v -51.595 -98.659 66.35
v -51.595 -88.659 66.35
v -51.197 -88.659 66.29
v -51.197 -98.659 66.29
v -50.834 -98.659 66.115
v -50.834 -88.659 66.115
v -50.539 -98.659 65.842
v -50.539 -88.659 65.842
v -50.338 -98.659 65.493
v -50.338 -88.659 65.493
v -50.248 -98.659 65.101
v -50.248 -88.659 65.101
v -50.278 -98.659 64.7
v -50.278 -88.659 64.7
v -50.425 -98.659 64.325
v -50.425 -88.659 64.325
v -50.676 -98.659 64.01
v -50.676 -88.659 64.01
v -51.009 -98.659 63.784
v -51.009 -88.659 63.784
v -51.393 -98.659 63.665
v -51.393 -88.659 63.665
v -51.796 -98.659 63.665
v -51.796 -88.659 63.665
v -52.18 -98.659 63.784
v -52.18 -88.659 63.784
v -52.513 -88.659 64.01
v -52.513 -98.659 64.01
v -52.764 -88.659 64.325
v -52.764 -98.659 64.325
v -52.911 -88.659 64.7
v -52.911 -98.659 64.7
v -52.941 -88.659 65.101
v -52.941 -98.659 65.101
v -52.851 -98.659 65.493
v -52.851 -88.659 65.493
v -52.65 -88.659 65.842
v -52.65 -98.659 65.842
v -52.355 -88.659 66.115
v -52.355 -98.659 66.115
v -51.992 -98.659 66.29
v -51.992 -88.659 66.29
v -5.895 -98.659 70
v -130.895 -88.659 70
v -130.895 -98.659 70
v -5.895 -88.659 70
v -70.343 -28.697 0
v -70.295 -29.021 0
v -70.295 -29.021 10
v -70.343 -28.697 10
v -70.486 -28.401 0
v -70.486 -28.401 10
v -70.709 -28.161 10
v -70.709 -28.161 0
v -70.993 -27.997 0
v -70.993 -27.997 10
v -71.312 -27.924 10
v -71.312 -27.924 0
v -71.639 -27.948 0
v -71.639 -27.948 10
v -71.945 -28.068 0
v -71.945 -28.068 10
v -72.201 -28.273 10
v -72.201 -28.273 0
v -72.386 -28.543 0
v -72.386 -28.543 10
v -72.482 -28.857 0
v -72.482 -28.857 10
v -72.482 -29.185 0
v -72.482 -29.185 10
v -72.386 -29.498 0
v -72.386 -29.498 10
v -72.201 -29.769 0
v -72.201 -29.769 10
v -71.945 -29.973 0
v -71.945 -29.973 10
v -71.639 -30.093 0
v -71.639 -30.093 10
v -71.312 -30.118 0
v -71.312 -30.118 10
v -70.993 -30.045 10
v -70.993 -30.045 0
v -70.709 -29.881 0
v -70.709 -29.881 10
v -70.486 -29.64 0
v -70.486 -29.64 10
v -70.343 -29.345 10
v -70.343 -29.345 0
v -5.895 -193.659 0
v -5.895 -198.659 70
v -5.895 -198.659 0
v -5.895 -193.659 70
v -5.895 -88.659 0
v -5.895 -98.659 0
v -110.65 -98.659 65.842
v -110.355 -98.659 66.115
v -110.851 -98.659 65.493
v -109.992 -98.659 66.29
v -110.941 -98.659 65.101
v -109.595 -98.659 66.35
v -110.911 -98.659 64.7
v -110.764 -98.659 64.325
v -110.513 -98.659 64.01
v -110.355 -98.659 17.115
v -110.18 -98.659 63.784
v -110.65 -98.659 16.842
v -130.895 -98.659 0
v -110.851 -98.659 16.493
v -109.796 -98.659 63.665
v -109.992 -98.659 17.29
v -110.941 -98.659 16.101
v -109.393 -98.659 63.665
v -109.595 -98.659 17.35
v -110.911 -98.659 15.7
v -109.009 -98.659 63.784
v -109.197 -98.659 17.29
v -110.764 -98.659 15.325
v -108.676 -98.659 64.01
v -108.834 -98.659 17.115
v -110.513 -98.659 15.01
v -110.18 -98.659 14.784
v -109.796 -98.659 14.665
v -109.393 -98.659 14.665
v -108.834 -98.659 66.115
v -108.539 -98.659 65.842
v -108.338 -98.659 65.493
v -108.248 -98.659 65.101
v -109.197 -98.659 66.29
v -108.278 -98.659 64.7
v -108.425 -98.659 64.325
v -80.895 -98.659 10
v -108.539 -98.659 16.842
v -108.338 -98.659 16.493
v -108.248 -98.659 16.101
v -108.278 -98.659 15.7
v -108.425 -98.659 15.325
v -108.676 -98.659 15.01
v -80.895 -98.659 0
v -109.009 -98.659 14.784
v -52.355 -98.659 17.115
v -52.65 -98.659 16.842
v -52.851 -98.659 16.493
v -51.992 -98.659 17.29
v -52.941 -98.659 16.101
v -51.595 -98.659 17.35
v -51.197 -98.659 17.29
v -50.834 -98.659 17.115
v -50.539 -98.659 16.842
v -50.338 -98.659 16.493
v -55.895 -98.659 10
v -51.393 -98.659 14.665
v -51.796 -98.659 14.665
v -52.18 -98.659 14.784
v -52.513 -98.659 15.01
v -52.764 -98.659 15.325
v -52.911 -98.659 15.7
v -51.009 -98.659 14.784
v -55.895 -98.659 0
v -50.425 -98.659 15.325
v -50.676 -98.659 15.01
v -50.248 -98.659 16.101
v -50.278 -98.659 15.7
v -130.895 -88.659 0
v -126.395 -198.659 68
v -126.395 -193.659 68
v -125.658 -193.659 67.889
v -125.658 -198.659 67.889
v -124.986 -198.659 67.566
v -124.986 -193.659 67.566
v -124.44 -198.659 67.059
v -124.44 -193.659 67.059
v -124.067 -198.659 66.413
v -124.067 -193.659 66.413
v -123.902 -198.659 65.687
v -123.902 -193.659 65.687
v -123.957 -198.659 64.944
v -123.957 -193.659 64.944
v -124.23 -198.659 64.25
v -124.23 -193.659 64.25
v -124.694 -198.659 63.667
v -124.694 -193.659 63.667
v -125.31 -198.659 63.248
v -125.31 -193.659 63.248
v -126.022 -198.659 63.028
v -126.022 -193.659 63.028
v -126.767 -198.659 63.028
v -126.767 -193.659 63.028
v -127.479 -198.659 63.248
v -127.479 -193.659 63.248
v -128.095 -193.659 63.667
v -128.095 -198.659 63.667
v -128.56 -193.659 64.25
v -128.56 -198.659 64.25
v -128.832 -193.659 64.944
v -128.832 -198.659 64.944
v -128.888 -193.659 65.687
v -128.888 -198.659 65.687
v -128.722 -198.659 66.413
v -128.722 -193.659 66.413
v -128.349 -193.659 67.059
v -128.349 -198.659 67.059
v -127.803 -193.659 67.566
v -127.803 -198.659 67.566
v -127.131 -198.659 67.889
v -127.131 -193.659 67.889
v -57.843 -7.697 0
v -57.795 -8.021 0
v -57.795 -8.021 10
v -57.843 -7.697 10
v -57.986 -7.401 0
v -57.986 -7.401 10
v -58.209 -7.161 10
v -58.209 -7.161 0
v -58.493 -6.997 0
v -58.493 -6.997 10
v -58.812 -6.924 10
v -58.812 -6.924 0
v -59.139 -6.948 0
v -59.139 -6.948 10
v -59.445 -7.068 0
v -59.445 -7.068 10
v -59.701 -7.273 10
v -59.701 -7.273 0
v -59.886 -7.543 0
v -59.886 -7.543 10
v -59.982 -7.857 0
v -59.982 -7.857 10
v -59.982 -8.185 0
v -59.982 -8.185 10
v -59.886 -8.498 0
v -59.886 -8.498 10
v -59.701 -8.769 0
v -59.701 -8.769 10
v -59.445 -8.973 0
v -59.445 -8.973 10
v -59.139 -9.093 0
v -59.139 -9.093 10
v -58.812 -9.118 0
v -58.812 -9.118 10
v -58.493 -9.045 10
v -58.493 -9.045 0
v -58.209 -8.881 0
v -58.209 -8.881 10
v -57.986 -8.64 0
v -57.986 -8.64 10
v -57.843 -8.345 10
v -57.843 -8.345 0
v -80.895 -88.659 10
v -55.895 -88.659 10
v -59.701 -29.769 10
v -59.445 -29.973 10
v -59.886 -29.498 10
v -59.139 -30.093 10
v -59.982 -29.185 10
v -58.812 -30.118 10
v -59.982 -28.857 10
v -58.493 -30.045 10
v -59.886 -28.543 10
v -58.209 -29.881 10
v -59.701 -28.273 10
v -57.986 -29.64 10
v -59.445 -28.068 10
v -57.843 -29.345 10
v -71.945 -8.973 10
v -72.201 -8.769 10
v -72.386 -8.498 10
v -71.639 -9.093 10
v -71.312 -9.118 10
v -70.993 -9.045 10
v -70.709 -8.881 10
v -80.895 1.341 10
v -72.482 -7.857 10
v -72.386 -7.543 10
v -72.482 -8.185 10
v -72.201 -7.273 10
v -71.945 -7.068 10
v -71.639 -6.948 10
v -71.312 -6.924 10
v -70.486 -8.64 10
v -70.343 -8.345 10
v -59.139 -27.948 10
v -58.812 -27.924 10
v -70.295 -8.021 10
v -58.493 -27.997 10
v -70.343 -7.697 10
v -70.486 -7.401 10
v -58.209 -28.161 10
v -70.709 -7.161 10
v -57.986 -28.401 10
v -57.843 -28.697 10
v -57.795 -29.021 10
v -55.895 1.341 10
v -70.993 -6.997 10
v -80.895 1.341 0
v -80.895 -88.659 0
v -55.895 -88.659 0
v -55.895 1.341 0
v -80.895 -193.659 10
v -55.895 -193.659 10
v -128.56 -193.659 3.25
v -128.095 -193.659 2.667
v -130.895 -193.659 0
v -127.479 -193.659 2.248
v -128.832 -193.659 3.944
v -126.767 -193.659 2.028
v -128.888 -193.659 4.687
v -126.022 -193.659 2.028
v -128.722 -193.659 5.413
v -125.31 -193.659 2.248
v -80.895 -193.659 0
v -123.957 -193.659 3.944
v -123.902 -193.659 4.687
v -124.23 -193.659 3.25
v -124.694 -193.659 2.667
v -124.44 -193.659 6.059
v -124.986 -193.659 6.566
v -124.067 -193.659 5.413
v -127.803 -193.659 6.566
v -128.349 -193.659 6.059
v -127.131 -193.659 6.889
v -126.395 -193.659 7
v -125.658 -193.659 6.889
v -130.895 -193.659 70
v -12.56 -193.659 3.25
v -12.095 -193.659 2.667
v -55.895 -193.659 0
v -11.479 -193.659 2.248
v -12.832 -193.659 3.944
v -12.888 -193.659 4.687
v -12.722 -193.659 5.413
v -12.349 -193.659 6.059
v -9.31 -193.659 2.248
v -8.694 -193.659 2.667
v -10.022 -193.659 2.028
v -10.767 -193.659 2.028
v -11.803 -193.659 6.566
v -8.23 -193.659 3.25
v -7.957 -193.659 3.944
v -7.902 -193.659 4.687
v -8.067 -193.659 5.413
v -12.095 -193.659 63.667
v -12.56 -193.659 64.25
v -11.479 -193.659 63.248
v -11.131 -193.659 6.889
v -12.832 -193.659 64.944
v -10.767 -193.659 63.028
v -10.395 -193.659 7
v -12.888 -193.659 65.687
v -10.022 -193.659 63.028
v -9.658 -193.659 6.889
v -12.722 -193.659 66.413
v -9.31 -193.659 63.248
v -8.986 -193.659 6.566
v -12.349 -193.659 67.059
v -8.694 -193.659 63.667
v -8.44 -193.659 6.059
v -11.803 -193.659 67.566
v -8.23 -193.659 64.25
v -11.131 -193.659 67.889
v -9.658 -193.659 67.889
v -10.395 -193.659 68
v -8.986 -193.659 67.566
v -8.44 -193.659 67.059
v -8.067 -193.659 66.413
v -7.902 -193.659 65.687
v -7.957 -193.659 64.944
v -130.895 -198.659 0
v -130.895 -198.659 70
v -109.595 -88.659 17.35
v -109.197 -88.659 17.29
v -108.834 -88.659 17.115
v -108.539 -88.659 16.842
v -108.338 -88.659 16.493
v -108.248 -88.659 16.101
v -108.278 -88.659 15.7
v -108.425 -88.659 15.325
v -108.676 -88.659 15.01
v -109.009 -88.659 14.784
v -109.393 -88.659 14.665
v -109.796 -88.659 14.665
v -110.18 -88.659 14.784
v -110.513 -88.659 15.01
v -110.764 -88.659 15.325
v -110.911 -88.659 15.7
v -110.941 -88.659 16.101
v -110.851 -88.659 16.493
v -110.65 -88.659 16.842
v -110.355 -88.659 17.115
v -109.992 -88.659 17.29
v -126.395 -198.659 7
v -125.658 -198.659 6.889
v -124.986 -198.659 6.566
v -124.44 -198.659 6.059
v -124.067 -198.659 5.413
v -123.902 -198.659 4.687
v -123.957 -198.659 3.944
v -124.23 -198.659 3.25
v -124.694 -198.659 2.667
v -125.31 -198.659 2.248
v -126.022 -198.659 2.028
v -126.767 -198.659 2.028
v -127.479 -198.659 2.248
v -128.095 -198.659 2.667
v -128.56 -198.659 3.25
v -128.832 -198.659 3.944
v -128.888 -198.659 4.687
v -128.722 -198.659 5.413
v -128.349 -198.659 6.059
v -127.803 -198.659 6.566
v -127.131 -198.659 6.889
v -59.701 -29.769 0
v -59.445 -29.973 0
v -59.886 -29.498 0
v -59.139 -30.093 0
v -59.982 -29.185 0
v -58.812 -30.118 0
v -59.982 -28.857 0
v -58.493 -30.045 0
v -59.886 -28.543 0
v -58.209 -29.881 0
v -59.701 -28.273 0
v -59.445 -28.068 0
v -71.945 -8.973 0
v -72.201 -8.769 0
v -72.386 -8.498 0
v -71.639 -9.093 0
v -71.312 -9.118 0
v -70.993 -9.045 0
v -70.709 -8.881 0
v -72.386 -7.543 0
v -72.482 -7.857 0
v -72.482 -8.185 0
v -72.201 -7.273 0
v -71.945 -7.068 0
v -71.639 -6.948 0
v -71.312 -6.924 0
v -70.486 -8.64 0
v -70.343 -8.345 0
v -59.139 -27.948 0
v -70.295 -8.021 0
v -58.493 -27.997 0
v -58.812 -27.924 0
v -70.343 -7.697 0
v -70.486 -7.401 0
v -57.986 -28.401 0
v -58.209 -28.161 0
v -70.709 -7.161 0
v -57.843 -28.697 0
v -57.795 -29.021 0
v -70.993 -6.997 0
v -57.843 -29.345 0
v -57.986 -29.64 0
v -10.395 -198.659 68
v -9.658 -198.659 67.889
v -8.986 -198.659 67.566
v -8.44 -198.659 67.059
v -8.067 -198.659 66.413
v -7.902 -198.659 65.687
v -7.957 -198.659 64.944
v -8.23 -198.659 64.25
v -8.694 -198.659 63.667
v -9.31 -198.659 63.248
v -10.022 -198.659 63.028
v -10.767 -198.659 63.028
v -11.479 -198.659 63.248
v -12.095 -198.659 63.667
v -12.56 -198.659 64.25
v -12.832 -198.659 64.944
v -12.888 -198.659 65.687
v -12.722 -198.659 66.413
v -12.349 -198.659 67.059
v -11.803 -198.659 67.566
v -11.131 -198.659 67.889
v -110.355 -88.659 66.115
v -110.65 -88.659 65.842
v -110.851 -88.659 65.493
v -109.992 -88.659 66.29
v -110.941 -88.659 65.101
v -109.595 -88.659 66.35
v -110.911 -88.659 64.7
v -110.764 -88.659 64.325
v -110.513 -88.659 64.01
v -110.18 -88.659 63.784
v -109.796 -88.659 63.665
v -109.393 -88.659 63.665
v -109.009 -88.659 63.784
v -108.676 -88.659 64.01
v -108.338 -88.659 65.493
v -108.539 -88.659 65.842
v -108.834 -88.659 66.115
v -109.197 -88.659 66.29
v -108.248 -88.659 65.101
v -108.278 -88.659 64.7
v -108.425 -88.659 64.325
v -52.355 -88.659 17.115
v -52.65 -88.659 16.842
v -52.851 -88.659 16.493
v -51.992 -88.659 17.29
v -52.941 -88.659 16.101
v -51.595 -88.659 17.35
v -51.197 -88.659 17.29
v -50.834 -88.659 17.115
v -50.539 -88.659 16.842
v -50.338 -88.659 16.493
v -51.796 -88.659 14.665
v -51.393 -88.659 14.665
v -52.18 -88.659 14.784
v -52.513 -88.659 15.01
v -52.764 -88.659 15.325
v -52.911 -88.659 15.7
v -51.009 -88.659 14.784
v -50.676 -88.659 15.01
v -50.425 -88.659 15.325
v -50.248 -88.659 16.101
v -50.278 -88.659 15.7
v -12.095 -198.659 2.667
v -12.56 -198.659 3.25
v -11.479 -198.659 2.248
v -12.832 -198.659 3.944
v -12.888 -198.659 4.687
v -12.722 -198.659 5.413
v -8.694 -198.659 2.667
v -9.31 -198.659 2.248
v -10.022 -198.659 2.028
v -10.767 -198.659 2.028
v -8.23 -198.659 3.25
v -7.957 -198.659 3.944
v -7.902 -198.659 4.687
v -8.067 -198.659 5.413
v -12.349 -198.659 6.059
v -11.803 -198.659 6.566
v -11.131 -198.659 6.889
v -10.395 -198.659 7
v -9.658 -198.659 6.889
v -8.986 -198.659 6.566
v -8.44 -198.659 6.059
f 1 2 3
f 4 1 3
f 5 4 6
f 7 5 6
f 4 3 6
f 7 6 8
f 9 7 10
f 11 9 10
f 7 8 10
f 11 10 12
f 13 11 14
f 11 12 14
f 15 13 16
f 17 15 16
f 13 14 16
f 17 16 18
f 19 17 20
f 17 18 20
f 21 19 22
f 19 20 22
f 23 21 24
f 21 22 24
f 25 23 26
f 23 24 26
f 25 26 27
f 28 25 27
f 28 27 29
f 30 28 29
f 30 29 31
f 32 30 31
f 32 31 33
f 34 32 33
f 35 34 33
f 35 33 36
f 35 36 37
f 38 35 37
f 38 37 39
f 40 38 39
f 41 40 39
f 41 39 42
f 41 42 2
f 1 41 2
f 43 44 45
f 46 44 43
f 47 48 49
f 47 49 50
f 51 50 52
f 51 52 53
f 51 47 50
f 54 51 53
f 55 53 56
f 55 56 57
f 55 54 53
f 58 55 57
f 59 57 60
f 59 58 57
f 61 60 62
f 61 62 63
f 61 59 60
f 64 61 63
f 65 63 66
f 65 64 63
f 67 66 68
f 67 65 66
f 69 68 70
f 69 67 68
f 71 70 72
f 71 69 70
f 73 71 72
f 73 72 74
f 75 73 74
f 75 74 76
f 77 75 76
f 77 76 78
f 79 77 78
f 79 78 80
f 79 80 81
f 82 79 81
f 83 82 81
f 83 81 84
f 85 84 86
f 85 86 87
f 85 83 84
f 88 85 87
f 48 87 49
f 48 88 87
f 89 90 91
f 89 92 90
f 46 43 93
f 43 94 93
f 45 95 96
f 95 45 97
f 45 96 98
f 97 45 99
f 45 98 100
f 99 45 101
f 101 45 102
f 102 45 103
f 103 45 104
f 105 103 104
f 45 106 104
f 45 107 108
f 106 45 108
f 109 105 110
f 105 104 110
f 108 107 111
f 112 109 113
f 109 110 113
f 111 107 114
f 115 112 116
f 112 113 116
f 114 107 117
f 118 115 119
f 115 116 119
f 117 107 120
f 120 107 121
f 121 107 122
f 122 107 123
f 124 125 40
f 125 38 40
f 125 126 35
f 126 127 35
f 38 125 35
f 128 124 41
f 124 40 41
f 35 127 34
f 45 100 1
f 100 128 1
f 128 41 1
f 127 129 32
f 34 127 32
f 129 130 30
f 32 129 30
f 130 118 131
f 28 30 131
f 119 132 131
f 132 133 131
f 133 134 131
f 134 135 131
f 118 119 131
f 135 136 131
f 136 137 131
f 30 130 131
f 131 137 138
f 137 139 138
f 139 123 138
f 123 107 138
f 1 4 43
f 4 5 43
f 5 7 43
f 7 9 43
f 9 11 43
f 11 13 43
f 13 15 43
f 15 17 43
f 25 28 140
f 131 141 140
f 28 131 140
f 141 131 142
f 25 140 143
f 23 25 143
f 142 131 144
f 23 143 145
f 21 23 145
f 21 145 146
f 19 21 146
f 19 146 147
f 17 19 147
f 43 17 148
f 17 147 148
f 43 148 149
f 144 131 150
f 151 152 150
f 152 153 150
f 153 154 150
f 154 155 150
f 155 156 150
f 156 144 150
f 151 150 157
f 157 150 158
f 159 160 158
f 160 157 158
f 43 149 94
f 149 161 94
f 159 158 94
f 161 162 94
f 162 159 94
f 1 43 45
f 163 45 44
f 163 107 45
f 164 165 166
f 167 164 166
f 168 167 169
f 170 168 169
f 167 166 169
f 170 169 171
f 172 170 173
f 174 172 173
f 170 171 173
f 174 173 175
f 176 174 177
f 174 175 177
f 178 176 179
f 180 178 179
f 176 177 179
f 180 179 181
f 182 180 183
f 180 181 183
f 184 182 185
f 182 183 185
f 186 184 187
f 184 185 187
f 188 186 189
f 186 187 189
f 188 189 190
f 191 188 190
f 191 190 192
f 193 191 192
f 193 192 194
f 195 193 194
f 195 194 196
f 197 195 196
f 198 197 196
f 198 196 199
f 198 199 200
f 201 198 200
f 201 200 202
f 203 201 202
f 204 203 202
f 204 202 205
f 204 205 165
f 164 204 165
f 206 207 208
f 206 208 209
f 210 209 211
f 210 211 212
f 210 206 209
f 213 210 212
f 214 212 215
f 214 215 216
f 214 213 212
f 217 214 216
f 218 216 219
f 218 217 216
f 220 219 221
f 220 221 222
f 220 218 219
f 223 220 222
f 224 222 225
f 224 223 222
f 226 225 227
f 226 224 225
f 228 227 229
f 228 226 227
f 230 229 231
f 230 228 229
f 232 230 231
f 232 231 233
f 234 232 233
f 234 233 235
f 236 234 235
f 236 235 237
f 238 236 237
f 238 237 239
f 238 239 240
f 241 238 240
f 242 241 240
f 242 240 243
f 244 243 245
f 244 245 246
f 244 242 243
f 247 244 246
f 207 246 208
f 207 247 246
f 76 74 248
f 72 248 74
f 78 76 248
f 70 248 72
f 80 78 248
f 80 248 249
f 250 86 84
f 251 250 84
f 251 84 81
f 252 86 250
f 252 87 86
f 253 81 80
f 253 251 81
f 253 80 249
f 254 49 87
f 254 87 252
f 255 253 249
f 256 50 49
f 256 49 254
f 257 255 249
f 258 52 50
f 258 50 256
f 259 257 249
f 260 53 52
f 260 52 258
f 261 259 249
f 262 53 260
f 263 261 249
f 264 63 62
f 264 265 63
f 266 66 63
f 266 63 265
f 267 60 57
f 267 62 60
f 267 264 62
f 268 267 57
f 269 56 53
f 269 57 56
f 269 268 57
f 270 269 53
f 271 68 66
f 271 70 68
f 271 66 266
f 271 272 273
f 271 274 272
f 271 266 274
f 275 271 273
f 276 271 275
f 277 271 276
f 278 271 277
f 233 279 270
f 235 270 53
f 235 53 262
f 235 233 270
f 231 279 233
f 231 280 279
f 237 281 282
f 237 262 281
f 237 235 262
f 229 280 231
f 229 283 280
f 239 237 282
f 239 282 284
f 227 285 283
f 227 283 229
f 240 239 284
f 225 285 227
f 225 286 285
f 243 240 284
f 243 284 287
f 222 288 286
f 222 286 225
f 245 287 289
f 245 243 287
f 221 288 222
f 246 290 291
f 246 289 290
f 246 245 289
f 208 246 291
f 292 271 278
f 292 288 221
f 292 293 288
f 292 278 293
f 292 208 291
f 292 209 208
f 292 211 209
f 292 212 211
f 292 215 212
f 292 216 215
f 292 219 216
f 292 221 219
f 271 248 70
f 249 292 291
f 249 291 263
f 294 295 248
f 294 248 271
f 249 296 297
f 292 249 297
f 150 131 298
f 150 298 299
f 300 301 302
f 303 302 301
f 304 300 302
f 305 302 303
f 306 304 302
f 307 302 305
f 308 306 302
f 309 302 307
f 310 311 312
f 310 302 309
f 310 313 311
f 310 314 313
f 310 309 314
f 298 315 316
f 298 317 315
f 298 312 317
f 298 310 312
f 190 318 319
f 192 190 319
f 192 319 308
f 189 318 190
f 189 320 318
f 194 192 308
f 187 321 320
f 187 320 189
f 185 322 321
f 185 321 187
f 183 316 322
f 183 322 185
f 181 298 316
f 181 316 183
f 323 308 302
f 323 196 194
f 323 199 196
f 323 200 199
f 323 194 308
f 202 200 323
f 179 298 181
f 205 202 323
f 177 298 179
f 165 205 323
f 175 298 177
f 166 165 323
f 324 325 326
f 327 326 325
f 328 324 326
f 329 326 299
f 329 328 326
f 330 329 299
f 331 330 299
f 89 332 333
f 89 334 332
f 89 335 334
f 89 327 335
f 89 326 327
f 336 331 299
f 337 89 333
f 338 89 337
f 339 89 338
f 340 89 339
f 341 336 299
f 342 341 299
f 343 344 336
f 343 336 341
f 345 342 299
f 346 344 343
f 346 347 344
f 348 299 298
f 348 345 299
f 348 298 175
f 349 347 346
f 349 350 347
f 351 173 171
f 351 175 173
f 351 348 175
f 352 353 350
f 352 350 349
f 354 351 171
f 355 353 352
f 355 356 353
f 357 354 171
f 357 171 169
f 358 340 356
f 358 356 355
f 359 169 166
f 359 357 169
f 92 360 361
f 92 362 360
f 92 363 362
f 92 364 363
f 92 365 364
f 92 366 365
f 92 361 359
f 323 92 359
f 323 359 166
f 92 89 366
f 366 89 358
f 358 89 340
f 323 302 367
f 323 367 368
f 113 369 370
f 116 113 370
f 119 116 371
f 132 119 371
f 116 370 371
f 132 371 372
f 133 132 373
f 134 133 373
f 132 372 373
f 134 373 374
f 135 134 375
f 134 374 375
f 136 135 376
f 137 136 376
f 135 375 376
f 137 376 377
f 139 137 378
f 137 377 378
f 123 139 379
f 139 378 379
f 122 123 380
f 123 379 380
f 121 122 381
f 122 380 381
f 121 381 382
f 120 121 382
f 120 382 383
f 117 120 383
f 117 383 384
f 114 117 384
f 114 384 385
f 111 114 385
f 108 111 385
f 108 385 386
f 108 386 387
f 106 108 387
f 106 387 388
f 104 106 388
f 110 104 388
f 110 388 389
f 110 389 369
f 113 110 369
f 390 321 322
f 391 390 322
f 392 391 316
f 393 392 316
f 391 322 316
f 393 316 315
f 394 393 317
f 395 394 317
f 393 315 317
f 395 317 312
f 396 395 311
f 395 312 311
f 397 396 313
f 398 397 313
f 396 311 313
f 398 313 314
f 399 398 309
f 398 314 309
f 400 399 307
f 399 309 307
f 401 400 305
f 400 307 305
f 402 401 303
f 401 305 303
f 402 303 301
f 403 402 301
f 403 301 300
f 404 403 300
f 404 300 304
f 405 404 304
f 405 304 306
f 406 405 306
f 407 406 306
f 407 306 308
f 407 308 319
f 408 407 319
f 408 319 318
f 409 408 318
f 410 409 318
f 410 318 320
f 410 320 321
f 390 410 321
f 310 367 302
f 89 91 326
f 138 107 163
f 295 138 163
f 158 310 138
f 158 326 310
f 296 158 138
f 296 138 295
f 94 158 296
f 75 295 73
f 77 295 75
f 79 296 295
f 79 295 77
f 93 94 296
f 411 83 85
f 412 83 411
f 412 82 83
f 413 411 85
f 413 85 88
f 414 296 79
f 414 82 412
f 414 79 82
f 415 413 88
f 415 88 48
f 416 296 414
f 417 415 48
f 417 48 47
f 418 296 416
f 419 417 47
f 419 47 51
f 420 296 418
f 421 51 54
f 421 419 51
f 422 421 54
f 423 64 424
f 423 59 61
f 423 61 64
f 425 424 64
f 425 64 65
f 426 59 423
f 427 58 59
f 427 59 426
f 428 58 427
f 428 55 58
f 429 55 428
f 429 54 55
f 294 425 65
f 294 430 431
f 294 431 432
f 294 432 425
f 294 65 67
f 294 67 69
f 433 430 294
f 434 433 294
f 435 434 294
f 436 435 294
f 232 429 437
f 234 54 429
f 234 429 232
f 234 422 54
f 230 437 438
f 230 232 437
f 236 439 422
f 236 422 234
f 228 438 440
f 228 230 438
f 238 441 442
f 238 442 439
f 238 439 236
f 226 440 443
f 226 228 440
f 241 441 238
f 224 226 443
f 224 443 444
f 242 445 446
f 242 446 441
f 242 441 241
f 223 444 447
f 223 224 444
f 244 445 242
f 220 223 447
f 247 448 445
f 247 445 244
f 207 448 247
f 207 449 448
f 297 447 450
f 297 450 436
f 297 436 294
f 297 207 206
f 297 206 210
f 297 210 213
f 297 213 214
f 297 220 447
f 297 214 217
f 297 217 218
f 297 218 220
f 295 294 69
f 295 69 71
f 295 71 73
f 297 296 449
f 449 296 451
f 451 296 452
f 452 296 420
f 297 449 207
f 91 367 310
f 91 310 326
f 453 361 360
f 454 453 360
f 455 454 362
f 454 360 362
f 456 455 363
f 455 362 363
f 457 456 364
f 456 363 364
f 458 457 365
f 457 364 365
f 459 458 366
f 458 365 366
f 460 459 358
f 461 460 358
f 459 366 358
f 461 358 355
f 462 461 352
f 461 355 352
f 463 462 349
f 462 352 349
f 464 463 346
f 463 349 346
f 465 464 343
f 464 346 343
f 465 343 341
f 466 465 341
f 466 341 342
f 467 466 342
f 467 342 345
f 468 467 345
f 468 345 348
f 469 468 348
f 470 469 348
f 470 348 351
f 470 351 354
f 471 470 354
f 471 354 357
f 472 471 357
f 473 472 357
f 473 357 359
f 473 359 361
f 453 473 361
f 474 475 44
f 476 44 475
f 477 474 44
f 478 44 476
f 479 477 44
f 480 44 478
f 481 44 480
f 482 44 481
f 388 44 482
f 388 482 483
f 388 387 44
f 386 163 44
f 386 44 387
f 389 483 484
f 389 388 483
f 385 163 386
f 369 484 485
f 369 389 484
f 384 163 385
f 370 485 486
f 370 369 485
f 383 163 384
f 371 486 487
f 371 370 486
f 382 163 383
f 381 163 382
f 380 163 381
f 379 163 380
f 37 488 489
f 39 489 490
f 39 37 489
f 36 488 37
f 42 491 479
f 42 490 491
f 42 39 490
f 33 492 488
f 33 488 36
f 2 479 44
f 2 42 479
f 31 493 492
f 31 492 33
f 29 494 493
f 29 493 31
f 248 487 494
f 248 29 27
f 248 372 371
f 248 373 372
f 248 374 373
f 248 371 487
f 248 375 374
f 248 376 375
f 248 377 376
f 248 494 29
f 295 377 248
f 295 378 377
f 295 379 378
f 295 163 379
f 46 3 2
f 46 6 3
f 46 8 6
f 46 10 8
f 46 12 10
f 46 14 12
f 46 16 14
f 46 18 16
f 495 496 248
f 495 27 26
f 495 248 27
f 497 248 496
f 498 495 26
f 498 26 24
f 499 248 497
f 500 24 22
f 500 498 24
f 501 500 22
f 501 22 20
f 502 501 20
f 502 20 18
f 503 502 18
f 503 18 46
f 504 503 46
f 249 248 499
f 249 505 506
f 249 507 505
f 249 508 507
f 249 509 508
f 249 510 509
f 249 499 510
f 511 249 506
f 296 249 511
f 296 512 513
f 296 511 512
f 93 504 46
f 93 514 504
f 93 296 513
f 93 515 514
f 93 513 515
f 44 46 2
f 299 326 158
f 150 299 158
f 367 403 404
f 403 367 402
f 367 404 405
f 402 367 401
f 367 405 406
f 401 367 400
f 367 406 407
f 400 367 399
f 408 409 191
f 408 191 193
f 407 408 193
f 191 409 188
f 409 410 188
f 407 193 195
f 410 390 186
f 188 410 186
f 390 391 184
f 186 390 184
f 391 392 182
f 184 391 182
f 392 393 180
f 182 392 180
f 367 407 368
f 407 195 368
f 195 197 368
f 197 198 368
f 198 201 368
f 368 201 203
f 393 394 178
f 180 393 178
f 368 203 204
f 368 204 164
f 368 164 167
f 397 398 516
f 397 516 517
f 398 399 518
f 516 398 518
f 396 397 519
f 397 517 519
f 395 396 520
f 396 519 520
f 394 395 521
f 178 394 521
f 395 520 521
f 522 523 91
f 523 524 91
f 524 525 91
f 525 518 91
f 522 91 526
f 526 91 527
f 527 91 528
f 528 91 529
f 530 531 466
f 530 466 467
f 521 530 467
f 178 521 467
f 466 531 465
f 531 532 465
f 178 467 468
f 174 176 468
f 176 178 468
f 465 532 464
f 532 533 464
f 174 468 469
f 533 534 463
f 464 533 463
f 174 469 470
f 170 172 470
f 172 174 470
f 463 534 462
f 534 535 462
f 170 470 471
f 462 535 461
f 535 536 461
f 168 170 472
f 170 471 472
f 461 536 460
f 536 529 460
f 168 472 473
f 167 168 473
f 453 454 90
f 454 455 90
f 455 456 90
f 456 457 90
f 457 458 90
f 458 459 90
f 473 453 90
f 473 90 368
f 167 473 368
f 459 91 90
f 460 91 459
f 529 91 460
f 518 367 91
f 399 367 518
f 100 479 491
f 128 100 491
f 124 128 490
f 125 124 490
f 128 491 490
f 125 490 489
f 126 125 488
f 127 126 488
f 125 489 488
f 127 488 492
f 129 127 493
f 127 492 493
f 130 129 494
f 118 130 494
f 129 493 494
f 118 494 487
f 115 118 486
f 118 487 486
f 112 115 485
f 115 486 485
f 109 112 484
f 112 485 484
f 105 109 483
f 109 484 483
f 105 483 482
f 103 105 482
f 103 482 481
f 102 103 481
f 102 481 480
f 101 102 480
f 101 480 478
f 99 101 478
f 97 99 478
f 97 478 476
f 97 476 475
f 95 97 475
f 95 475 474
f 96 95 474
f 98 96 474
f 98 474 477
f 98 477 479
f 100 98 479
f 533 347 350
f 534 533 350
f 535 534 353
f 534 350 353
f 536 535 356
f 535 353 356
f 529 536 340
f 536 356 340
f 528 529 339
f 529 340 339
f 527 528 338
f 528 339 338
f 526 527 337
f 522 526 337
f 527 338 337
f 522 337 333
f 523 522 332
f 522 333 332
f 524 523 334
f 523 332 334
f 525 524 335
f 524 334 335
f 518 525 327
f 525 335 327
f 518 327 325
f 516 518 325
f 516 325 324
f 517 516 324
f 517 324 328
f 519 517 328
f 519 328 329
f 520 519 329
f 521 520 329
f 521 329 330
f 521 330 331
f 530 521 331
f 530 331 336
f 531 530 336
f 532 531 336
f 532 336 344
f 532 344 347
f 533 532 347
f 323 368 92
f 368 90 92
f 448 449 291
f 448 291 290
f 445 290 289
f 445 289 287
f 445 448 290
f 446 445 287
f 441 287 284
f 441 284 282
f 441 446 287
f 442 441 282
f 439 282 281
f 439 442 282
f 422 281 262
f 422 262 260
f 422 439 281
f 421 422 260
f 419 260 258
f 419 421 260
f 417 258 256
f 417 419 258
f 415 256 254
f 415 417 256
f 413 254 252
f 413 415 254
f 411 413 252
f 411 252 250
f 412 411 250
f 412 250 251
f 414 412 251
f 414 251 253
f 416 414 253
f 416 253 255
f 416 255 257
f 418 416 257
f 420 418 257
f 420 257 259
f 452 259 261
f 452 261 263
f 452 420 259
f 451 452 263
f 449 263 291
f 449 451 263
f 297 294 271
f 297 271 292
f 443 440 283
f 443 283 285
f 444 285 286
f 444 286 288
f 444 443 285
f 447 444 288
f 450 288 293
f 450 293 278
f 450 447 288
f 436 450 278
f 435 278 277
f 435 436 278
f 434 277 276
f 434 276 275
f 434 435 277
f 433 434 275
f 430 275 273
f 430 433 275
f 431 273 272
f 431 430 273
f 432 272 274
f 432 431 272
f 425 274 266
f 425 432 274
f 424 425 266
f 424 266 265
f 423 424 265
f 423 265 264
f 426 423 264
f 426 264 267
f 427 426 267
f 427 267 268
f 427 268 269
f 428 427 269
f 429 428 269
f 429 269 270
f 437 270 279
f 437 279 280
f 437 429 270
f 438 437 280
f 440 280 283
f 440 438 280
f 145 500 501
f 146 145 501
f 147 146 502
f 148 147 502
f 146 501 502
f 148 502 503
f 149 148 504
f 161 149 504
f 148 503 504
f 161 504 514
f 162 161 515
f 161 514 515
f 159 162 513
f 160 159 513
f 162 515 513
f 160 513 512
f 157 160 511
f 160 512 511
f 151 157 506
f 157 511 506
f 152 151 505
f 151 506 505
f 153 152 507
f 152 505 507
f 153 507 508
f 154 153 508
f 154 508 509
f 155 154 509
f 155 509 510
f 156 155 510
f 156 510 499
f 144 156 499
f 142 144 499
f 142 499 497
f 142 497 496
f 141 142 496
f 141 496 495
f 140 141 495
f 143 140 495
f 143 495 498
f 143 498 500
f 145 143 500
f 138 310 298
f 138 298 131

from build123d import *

# Parameters (mm, degrees)
SKETCH2_W           = 25
SKETCH2_H           = 90
SKETCH2_R           = 1.1
SKETCH2_H_2         = 10
SKETCH2_W_2         = 50
SKETCH2_H_3         = 100
BOSS_EXTRUDE3_DEPTH = 10
SKETCH5_W           = 125
SKETCH5_H           = 10
BOSS_EXTRUDE4_DEPTH = 60
SKETCH6_W           = 75
SKETCH6_H           = 5
BOSS_EXTRUDE5_DEPTH = 60
SKETCH8_W           = 10
SKETCH8_H           = 5
BOSS_EXTRUDE7_DEPTH = 50
SKETCH7_W           = 70
SKETCH7_H           = 5
BOSS_EXTRUDE8_DEPTH = 50
SKETCH12_R          = 2.5
CUT_EXTRUDE1_DEPTH  = 246.068129549
CUT_EXTRUDE2_REACH  = 186.752
SKETCH13_R          = 1.35


with BuildPart() as part:
    # Sketch2 → Boss-Extrude3 (new body)
    # profile 1 of 5: a face of its own
    with BuildSketch(Plane.XY):
        with Locations((-68.394568721, -43.658737525)):
            Rectangle(SKETCH2_W, SKETCH2_H)
        with Locations((-71.394568721, -29.020737525)):
            Circle(SKETCH2_R, mode=Mode.SUBTRACT)
        with Locations((-71.394568721, -8.020737525)):
            Circle(SKETCH2_R, mode=Mode.SUBTRACT)
        with Locations((-58.894568721, -29.020737525)):
            Circle(SKETCH2_R, mode=Mode.SUBTRACT)
        with Locations((-58.894568721, -8.020737525)):
            Circle(SKETCH2_R, mode=Mode.SUBTRACT)
    # profile 2 of 5: a face of its own
    with BuildSketch(Plane.XY):
        with Locations((-68.394568721, -93.658737525)):
            Rectangle(SKETCH2_W, SKETCH2_H_2)
    # profile 3 of 5: a face of its own
    with BuildSketch(Plane.XY):
        with Locations((-105.894568721, -93.658737525)):
            Rectangle(SKETCH2_W_2, SKETCH2_H_2)
    # profile 4 of 5: a face of its own
    with BuildSketch(Plane.XY):
        with Locations((-30.894568721, -93.658737525)):
            Rectangle(SKETCH2_W_2, SKETCH2_H_2)
    # profile 5 of 5: a face of its own
    with BuildSketch(Plane.XY):
        with Locations((-68.394568721, -148.658737525)):
            Rectangle(SKETCH2_W, SKETCH2_H_3)
    extrude(amount=BOSS_EXTRUDE3_DEPTH)

    # Sketch5 → Boss-Extrude4 (add)
    with BuildSketch(Plane.XY.offset(10)):
        with Locations((-68.394568721, -93.658737525)):
            Rectangle(SKETCH5_W, SKETCH5_H)
    extrude(amount=BOSS_EXTRUDE4_DEPTH)

    # Sketch6 → Boss-Extrude5 (add)
    with BuildSketch(Plane.XY.offset(10)):
        with Locations((-43.394568721, -196.158737525)):
            Rectangle(SKETCH6_W, SKETCH6_H)
    extrude(amount=BOSS_EXTRUDE5_DEPTH)

    # Sketch8 → Boss-Extrude7 (add)
    with BuildSketch(Plane(origin=(-55.894568721, 0, 0), x_dir=(0, 0, -1), z_dir=(1, 0, 0))):
        with Locations((-5, -196.158737525)):
            Rectangle(SKETCH8_W, SKETCH8_H)
    extrude(amount=BOSS_EXTRUDE7_DEPTH)

    # Sketch7 → Boss-Extrude8 (add)
    with BuildSketch(Plane.ZY.offset(80.894568721)):
        with Locations((35, -196.158737525)):
            Rectangle(SKETCH7_W, SKETCH7_H)
    extrude(amount=BOSS_EXTRUDE8_DEPTH)

    # Sketch12 → Cut-Extrude1 (cut, through all)
    with BuildSketch(Plane(origin=(0, -193.658737525, 0), x_dir=(1, 0, 0), z_dir=(0, 1, 0))):
        with Locations(Location((-126.394568721, -4.5, 0), (0, 0, 270))):
            Circle(SKETCH12_R)
        with Locations(Location((-126.394568721, -65.5, 0), (0, 0, 270))):
            Circle(SKETCH12_R)
        with Locations(Location((-10.394568721, -65.5, 0), (0, 0, 270))):
            Circle(SKETCH12_R)
        with Locations(Location((-10.394568721, -4.5, 0), (0, 0, 270))):
            Circle(SKETCH12_R)
    extrude(amount=-CUT_EXTRUDE1_DEPTH, mode=Mode.SUBTRACT)

    # Sketch13 → Cut-Extrude2 (cut, up to next)
    with BuildSketch(Plane(origin=(0, -88.658737525, 0), x_dir=(1, 0, 0), z_dir=(0, 1, 0)), mode=Mode.PRIVATE) as cut_extrude2_sk1:
        with Locations(Location((-109.594568721, -16, 0), (0, 0, 270))):
            Circle(SKETCH13_R)
    cut_extrude2_tool1 = extrude(cut_extrude2_sk1.sketch, amount=-CUT_EXTRUDE2_REACH, mode=Mode.PRIVATE) & part.part
    # Sketch13 → Cut-Extrude2 (cut, up to next)
    with BuildSketch(Plane(origin=(0, -88.658737525, 0), x_dir=(1, 0, 0), z_dir=(0, 1, 0)), mode=Mode.PRIVATE) as cut_extrude2_sk2:
        with Locations(Location((-109.594568721, -65, 0), (0, 0, 270))):
            Circle(SKETCH13_R)
    cut_extrude2_tool2 = extrude(cut_extrude2_sk2.sketch, amount=-CUT_EXTRUDE2_REACH, mode=Mode.PRIVATE) & part.part
    # Sketch13 → Cut-Extrude2 (cut, up to next)
    with BuildSketch(Plane(origin=(0, -88.658737525, 0), x_dir=(1, 0, 0), z_dir=(0, 1, 0)), mode=Mode.PRIVATE) as cut_extrude2_sk3:
        with Locations(Location((-51.594568721, -65, 0), (0, 0, 270))):
            Circle(SKETCH13_R)
    cut_extrude2_tool3 = extrude(cut_extrude2_sk3.sketch, amount=-CUT_EXTRUDE2_REACH, mode=Mode.PRIVATE) & part.part
    # Sketch13 → Cut-Extrude2 (cut, up to next)
    with BuildSketch(Plane(origin=(0, -88.658737525, 0), x_dir=(1, 0, 0), z_dir=(0, 1, 0)), mode=Mode.PRIVATE) as cut_extrude2_sk4:
        with Locations(Location((-51.594568721, -16, 0), (0, 0, 270))):
            Circle(SKETCH13_R)
    cut_extrude2_tool4 = extrude(cut_extrude2_sk4.sketch, amount=-CUT_EXTRUDE2_REACH, mode=Mode.PRIVATE) & part.part
    add(cut_extrude2_tool1.solids().sort_by_distance((-109.594569, -88.658738, 16))[0], mode=Mode.SUBTRACT)
    add(cut_extrude2_tool2.solids().sort_by_distance((-109.594569, -88.658738, 65))[0], mode=Mode.SUBTRACT)
    add(cut_extrude2_tool3.solids().sort_by_distance((-51.594569, -88.658738, 65))[0], mode=Mode.SUBTRACT)
    add(cut_extrude2_tool4.solids().sort_by_distance((-51.594569, -88.658738, 16))[0], mode=Mode.SUBTRACT)


solid = part.part
